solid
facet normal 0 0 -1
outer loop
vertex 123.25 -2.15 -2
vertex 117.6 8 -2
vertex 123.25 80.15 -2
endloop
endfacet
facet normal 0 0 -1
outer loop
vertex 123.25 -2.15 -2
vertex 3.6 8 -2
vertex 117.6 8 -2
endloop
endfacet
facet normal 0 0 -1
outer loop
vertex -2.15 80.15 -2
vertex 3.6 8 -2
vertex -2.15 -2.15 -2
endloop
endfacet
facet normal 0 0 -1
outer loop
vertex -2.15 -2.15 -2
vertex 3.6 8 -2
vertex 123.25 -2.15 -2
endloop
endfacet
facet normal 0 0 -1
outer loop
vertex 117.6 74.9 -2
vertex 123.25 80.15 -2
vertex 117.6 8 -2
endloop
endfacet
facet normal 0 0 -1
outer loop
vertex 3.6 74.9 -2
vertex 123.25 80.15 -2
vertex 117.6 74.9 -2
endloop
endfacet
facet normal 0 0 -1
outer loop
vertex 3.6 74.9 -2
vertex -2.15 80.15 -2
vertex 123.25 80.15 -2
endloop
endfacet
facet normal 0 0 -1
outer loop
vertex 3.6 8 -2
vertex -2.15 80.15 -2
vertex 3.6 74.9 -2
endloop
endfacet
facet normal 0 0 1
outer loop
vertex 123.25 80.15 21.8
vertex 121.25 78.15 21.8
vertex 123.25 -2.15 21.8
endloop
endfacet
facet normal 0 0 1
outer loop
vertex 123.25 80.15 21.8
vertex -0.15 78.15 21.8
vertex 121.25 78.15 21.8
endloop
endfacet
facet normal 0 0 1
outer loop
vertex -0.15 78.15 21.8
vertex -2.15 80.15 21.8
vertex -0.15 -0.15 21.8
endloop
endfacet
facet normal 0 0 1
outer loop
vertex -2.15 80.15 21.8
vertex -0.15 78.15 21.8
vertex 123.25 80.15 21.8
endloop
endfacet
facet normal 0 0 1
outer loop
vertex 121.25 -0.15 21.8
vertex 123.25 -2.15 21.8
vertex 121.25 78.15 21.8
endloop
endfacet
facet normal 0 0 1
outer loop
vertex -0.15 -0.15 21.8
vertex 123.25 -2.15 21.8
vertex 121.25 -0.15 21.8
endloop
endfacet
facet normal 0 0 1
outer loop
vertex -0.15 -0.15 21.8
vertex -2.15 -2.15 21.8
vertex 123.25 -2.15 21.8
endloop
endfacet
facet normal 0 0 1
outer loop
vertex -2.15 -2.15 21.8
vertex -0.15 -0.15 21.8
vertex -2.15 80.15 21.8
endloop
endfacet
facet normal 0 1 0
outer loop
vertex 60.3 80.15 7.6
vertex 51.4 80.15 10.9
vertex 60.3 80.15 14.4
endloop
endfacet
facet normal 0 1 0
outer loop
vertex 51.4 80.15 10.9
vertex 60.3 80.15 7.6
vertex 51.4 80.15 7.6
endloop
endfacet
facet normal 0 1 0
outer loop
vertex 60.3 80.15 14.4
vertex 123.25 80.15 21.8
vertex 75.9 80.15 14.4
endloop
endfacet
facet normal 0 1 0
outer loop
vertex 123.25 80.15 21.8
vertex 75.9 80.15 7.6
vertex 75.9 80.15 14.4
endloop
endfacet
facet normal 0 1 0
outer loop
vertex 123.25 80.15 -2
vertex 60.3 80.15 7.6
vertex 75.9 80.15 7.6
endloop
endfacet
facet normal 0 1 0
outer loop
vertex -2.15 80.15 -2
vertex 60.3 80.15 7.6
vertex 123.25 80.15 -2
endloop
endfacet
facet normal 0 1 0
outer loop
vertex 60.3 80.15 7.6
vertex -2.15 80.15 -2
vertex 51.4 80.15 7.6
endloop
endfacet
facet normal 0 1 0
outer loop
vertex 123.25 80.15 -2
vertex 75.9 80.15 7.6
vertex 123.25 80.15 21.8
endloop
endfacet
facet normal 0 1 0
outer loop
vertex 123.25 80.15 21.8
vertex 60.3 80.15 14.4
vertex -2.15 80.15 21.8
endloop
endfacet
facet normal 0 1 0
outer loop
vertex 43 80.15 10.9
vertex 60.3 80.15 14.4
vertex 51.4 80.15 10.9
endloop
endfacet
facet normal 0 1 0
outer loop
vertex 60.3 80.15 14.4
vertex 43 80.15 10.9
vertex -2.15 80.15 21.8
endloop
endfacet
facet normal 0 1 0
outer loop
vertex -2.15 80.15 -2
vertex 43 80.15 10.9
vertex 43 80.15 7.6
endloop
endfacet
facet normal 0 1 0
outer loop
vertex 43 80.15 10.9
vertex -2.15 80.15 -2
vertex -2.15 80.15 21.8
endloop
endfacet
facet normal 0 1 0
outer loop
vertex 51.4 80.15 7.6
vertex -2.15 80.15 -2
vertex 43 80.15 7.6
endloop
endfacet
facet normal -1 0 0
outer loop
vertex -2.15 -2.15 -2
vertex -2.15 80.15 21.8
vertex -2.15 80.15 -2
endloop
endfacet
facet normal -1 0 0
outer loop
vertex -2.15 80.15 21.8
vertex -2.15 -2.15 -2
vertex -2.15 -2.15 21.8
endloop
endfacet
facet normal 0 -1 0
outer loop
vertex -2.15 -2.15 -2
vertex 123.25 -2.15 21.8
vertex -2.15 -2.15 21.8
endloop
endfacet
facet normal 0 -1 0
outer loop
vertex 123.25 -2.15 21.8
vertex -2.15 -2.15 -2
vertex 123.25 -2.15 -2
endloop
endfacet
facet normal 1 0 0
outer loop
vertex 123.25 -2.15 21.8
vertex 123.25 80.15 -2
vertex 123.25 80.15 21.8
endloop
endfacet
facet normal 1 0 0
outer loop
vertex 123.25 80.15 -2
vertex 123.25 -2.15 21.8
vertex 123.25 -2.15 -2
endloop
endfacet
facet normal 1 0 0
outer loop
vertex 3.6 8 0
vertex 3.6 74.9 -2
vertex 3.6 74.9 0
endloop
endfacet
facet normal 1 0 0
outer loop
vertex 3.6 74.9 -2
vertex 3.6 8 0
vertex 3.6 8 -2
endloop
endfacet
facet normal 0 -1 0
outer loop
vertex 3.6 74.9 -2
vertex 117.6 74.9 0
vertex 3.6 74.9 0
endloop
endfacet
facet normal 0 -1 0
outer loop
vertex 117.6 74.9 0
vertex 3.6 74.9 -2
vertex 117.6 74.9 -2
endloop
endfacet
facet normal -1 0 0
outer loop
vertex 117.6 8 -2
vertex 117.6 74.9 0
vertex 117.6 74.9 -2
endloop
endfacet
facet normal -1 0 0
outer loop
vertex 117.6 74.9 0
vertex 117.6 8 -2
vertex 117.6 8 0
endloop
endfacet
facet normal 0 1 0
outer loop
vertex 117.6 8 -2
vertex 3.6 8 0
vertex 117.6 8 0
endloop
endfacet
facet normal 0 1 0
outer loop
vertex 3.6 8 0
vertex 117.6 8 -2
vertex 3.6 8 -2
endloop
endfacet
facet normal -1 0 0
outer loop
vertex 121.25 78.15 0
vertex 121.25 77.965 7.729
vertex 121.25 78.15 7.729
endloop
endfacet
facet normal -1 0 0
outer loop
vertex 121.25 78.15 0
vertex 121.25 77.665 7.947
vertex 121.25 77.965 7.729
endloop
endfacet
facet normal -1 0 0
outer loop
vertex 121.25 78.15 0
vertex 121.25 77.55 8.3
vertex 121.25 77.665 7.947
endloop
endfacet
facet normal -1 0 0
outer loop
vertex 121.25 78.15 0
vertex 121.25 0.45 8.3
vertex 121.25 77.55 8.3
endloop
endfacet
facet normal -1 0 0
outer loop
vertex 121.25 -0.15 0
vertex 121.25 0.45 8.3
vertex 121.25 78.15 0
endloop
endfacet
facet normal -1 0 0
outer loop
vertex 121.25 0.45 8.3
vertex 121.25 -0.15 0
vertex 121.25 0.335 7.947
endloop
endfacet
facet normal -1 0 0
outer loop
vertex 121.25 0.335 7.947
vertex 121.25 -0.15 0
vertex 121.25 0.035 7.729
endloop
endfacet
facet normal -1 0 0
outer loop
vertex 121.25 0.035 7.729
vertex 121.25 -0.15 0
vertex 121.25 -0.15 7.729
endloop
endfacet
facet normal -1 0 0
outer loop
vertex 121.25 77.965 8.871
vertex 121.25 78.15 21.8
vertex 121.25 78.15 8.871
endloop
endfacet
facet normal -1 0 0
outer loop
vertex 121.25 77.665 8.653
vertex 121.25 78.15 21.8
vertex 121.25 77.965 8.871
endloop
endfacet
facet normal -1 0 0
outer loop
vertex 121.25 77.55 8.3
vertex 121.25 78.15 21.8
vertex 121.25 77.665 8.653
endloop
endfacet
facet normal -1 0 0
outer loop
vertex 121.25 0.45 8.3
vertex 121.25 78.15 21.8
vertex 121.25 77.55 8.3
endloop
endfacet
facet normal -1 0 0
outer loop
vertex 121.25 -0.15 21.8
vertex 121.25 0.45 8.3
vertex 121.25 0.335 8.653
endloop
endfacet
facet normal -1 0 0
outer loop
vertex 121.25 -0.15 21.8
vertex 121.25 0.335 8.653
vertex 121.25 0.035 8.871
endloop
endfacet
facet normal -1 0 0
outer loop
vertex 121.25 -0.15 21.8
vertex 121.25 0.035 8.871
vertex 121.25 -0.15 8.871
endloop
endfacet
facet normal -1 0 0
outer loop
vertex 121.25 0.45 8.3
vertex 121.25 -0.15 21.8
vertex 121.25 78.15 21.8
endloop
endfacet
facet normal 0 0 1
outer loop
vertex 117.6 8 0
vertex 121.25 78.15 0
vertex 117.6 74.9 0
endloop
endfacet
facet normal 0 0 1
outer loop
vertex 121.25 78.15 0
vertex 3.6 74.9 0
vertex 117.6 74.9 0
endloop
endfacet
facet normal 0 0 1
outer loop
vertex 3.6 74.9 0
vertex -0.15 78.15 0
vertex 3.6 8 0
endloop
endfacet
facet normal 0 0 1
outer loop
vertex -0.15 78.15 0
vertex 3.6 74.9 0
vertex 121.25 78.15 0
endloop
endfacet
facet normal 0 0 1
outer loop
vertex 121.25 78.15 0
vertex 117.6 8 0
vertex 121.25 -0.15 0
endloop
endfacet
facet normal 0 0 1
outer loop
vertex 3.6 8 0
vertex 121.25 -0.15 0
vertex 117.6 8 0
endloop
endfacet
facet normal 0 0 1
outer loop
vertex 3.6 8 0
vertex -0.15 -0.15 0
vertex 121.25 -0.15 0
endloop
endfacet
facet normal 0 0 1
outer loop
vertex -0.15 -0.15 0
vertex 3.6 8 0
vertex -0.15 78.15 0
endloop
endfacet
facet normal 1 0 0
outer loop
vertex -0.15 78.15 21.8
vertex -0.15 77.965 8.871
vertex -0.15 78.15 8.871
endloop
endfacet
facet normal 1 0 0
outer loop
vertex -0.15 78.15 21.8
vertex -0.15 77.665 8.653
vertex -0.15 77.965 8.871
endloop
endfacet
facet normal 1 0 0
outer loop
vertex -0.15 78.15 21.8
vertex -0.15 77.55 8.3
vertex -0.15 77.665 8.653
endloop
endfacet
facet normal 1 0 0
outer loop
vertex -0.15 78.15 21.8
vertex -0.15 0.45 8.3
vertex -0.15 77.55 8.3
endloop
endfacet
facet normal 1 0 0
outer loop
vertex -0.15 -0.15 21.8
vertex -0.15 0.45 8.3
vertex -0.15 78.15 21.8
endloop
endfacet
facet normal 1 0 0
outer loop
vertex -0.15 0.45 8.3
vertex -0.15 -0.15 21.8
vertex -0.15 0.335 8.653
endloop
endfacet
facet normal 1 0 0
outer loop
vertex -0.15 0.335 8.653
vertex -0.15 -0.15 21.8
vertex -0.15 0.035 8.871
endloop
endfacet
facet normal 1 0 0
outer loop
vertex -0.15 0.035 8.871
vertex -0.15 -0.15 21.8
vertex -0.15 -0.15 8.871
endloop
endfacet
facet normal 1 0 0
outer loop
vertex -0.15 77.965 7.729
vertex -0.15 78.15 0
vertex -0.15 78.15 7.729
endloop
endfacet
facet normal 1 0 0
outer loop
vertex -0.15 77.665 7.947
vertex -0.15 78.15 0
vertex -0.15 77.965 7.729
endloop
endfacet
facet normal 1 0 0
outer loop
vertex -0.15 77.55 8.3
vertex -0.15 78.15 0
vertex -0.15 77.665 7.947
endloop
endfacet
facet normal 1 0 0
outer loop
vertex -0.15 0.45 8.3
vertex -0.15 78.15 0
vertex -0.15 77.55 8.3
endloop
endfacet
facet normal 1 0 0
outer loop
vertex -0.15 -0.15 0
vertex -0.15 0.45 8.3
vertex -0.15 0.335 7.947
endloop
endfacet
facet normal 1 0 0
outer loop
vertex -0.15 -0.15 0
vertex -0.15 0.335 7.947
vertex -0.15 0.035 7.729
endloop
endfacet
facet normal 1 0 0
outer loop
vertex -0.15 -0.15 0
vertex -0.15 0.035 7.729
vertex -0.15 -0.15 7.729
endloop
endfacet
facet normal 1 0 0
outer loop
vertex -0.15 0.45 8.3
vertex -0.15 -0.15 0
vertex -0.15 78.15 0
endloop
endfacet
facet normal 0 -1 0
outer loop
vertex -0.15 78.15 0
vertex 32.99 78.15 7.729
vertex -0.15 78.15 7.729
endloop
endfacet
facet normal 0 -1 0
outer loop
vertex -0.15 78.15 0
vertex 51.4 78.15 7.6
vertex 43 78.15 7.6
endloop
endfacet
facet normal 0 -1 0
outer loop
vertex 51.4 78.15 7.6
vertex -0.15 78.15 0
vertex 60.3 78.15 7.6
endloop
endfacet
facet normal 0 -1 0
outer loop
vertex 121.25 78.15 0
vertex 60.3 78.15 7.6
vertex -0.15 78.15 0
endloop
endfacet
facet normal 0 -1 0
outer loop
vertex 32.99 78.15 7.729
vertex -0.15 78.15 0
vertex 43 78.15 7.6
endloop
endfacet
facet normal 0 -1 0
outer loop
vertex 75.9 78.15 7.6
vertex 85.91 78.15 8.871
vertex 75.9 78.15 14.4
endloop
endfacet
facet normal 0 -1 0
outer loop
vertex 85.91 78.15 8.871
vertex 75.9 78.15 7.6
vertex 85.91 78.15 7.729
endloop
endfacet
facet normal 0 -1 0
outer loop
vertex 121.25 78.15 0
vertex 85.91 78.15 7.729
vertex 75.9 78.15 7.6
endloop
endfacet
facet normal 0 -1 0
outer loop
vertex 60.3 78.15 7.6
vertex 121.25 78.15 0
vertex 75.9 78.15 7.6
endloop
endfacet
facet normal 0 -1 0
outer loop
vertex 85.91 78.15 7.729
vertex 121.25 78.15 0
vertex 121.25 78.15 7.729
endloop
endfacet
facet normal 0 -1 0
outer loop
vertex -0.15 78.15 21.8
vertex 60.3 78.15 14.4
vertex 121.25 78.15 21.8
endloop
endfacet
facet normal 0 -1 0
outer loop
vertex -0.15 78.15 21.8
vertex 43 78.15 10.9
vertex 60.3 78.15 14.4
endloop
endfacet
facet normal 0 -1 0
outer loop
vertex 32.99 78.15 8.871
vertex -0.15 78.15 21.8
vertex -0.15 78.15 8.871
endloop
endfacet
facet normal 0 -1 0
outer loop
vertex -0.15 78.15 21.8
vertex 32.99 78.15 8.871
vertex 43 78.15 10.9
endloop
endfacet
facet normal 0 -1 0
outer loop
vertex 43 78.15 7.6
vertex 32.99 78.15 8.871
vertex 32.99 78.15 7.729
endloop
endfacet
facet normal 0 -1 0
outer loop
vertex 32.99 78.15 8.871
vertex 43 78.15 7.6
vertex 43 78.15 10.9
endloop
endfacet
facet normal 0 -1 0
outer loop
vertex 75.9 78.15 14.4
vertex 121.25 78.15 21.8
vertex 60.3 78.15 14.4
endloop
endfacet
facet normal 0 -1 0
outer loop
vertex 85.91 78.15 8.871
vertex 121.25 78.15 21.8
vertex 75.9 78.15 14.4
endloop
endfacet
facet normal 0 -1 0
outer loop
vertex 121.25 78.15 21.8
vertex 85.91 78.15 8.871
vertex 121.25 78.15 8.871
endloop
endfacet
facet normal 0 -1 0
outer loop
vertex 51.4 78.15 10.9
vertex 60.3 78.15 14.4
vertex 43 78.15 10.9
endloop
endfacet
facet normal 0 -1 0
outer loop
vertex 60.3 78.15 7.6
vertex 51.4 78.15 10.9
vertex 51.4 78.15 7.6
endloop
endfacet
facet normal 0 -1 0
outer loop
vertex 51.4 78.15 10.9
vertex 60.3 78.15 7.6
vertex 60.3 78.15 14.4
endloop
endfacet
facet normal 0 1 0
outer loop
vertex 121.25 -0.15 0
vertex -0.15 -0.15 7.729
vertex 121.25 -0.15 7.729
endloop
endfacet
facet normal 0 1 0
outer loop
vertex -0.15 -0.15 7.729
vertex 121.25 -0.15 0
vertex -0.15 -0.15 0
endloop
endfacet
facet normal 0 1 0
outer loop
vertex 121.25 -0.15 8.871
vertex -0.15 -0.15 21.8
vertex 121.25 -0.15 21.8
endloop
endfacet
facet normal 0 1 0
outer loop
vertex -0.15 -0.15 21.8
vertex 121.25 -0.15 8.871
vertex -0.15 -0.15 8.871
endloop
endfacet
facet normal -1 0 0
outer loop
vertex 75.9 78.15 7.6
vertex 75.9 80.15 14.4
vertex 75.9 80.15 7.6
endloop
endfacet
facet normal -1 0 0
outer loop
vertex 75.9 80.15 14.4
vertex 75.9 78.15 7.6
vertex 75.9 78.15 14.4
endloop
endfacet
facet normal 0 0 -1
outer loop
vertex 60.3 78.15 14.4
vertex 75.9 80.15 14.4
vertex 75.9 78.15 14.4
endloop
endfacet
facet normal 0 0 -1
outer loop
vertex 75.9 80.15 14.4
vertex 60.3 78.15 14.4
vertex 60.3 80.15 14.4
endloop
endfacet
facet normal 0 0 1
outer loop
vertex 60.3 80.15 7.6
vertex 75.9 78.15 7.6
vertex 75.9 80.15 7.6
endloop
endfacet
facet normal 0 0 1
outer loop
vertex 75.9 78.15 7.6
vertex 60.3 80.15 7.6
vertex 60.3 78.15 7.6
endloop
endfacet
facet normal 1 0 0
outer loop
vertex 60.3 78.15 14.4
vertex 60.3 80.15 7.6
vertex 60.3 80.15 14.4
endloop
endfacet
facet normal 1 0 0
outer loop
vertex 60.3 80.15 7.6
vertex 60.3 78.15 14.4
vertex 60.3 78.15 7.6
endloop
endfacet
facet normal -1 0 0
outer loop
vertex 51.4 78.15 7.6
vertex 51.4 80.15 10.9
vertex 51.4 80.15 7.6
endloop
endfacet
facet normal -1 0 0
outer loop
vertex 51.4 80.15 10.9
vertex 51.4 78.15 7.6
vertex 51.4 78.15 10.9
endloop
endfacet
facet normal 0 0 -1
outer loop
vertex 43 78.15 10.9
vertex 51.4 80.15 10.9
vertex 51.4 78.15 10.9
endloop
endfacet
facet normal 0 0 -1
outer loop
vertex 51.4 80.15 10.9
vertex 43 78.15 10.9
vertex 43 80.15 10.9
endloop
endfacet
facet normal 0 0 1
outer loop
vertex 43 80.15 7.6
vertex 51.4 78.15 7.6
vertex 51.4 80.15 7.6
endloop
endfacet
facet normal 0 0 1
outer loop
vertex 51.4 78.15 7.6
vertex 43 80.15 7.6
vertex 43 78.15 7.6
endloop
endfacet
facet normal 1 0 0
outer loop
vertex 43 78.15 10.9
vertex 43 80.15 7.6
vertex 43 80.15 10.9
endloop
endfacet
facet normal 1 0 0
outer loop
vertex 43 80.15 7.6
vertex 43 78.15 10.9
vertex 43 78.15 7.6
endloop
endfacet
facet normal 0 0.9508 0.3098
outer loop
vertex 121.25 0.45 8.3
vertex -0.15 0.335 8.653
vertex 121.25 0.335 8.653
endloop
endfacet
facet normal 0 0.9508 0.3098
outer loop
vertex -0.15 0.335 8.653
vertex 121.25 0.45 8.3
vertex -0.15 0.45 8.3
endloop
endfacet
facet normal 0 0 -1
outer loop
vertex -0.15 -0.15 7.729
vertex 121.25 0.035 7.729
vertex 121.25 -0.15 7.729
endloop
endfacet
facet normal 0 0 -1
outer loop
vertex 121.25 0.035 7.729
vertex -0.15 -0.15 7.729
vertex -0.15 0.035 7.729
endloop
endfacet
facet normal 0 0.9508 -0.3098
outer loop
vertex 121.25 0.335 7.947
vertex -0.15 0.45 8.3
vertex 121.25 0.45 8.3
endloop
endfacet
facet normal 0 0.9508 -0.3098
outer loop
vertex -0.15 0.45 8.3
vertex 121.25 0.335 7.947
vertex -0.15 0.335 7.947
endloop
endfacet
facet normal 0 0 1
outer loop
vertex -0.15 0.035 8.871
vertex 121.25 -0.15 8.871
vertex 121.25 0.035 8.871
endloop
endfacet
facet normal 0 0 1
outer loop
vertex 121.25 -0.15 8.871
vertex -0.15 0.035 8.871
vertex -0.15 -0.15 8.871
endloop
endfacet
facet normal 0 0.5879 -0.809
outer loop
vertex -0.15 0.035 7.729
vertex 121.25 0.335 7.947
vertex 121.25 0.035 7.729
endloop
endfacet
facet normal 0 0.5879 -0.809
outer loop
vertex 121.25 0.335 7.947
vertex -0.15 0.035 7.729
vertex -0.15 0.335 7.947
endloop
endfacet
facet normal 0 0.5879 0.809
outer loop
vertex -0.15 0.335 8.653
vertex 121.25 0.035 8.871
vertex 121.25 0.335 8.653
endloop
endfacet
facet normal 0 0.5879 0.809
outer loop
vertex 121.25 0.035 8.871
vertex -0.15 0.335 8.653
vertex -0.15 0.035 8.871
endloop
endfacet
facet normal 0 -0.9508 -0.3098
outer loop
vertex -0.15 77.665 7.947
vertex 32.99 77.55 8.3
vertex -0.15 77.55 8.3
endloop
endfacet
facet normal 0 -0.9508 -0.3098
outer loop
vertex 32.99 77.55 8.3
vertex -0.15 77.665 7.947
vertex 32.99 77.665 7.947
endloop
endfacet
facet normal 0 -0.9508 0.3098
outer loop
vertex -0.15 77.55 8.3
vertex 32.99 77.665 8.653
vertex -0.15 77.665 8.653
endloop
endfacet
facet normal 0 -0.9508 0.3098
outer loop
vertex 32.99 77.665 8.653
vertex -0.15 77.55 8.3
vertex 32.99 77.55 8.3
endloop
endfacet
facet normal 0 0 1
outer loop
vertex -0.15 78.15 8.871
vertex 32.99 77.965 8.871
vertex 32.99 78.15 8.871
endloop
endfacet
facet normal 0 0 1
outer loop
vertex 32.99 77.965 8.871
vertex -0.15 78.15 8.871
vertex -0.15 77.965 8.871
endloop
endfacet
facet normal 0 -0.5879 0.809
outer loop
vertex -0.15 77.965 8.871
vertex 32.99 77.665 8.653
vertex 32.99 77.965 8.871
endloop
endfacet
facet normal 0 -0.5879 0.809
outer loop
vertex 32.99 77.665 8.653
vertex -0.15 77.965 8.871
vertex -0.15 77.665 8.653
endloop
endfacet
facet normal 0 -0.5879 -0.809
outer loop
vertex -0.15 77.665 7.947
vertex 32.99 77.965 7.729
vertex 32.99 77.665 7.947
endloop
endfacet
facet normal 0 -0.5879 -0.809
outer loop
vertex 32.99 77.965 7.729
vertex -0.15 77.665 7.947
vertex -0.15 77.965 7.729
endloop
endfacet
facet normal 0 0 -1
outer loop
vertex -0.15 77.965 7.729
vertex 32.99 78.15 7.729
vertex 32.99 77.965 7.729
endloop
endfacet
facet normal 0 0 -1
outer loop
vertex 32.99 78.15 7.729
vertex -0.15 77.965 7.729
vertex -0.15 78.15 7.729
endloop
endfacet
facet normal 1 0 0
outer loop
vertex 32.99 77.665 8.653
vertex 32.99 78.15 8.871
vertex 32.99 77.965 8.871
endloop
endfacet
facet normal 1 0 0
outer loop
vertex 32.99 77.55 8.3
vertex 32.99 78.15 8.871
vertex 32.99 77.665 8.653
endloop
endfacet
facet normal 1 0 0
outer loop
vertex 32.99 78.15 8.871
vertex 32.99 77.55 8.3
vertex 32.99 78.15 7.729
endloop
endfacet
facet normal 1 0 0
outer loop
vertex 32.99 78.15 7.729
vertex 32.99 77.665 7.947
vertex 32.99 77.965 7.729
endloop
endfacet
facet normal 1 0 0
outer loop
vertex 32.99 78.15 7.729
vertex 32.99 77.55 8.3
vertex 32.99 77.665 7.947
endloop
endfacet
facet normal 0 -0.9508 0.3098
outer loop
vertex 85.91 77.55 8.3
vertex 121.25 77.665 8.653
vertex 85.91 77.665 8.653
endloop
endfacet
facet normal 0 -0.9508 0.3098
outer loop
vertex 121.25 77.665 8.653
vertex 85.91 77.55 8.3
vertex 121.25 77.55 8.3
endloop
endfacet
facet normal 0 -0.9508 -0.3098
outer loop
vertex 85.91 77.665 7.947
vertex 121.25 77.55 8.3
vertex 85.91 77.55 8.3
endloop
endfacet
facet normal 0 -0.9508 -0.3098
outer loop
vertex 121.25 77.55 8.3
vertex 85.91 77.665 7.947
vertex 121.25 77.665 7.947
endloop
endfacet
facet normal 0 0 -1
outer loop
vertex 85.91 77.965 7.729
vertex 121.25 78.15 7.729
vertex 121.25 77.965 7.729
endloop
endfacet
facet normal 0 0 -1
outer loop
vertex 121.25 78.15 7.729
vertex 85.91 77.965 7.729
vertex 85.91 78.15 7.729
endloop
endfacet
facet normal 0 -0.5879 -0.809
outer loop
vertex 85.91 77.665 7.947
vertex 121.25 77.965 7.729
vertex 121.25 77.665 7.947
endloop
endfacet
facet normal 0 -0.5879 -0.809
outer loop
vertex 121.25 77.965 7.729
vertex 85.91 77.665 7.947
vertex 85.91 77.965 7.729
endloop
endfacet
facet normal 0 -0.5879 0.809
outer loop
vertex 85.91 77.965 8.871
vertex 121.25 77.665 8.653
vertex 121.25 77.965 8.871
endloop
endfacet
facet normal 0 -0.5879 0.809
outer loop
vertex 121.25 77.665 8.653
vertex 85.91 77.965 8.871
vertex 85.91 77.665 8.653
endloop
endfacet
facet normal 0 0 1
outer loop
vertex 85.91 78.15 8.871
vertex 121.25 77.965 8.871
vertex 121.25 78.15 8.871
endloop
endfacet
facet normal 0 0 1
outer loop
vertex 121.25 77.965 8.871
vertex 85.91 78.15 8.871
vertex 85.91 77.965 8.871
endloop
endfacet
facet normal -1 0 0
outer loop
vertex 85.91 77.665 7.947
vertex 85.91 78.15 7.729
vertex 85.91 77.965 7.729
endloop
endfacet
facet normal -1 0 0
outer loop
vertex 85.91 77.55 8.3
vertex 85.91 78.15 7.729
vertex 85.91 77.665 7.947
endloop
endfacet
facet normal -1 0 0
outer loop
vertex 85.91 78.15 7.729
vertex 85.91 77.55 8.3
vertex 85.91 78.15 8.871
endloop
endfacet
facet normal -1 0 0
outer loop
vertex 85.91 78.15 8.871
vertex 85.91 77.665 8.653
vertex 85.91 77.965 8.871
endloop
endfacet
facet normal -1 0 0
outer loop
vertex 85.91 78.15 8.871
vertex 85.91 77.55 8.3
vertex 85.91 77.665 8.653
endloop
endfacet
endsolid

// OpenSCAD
$fa = 1;
$fs = 0.4;

shell = 2;
port_tol = 0.2;
size_tol = 0.15;
extra_height = 14;
ridge_radius = 0.6;
ridge_offset = 0.5;
ridge_port_gap = 10;

outer_width = 121.1;
outer_length = 78;
outer_height = 7.8;

margin_left = 3.6;
margin_right = 3.5;
margin_top = 3.1;
margin_bot = 8;

hdmi_left = 45.4;
hdmi_width = 15.2;
hdmi_height = 6.4;
usb_right = 43.2;
usb_width = 8;
usb_height = 2.9;

eps = 0.01;

module rectangle(x, y, width, length) {
    translate([x, y]) square([width, length]);
}

module ridge(length) {
    linear_extrude(length) intersection() {
        circle(ridge_radius);
        translate([-eps, -2 * ridge_radius]) {
            square(4 * ridge_radius);
        }
    }
}

// Origin is the bottom left corner, where the monitor sits.

difference() {
    // Outer shell
    translate([0, 0, -shell]) {
        linear_extrude(outer_height + shell + extra_height) {
            difference() {
                rectangle(
                    -shell - size_tol,
                    -shell - size_tol,
                    outer_width + 2 * (shell + size_tol),
                    outer_length + 2 * (shell + size_tol)
                );
                // Window for screen
                rectangle(
                    margin_left, margin_bot,
                    outer_width - margin_left - margin_right,
                    outer_length - margin_top - margin_bot
                );
            }
        }
    }
    // Inner cavity for monitor
    translate([-size_tol, -size_tol, 0]) cube([
        outer_width + 2 * size_tol,
        outer_length + 2 * size_tol,
        outer_height + extra_height + eps
    ]);
    
    // HDMI port
    translate([
        outer_width - hdmi_left - hdmi_width - port_tol,
        outer_length + size_tol - eps,
        outer_height - port_tol
    ]) cube([
        hdmi_width + 2 * port_tol,
        shell + 2 * eps,
        hdmi_height + 2 * port_tol
    ]);
    
    // USB port
    translate([
        usb_right - port_tol,
        outer_length + size_tol - eps,
        outer_height - port_tol
    ]) cube([
        usb_width + 2 * port_tol,
        shell + 2 * eps,
        usb_height + 2 * port_tol
    ]);
}

// Back ridge
translate([
    -size_tol, -size_tol, outer_height + ridge_offset
]) {
    rotate([90, 0, 90]) ridge(outer_width + 2 * size_tol);
}

// USB-side ridge
translate([
    -size_tol - eps, outer_length + size_tol,
    outer_height + ridge_offset
]) {
    rotate([-90, 0, -90]) ridge(
        usb_right - port_tol - ridge_port_gap + size_tol
    );
}
translate([
    outer_width + size_tol + eps, outer_length + size_tol,
    outer_height + ridge_offset
]) {
    rotate([90, 0, -90]) ridge(
        hdmi_left - port_tol - ridge_port_gap + size_tol
    );
}
